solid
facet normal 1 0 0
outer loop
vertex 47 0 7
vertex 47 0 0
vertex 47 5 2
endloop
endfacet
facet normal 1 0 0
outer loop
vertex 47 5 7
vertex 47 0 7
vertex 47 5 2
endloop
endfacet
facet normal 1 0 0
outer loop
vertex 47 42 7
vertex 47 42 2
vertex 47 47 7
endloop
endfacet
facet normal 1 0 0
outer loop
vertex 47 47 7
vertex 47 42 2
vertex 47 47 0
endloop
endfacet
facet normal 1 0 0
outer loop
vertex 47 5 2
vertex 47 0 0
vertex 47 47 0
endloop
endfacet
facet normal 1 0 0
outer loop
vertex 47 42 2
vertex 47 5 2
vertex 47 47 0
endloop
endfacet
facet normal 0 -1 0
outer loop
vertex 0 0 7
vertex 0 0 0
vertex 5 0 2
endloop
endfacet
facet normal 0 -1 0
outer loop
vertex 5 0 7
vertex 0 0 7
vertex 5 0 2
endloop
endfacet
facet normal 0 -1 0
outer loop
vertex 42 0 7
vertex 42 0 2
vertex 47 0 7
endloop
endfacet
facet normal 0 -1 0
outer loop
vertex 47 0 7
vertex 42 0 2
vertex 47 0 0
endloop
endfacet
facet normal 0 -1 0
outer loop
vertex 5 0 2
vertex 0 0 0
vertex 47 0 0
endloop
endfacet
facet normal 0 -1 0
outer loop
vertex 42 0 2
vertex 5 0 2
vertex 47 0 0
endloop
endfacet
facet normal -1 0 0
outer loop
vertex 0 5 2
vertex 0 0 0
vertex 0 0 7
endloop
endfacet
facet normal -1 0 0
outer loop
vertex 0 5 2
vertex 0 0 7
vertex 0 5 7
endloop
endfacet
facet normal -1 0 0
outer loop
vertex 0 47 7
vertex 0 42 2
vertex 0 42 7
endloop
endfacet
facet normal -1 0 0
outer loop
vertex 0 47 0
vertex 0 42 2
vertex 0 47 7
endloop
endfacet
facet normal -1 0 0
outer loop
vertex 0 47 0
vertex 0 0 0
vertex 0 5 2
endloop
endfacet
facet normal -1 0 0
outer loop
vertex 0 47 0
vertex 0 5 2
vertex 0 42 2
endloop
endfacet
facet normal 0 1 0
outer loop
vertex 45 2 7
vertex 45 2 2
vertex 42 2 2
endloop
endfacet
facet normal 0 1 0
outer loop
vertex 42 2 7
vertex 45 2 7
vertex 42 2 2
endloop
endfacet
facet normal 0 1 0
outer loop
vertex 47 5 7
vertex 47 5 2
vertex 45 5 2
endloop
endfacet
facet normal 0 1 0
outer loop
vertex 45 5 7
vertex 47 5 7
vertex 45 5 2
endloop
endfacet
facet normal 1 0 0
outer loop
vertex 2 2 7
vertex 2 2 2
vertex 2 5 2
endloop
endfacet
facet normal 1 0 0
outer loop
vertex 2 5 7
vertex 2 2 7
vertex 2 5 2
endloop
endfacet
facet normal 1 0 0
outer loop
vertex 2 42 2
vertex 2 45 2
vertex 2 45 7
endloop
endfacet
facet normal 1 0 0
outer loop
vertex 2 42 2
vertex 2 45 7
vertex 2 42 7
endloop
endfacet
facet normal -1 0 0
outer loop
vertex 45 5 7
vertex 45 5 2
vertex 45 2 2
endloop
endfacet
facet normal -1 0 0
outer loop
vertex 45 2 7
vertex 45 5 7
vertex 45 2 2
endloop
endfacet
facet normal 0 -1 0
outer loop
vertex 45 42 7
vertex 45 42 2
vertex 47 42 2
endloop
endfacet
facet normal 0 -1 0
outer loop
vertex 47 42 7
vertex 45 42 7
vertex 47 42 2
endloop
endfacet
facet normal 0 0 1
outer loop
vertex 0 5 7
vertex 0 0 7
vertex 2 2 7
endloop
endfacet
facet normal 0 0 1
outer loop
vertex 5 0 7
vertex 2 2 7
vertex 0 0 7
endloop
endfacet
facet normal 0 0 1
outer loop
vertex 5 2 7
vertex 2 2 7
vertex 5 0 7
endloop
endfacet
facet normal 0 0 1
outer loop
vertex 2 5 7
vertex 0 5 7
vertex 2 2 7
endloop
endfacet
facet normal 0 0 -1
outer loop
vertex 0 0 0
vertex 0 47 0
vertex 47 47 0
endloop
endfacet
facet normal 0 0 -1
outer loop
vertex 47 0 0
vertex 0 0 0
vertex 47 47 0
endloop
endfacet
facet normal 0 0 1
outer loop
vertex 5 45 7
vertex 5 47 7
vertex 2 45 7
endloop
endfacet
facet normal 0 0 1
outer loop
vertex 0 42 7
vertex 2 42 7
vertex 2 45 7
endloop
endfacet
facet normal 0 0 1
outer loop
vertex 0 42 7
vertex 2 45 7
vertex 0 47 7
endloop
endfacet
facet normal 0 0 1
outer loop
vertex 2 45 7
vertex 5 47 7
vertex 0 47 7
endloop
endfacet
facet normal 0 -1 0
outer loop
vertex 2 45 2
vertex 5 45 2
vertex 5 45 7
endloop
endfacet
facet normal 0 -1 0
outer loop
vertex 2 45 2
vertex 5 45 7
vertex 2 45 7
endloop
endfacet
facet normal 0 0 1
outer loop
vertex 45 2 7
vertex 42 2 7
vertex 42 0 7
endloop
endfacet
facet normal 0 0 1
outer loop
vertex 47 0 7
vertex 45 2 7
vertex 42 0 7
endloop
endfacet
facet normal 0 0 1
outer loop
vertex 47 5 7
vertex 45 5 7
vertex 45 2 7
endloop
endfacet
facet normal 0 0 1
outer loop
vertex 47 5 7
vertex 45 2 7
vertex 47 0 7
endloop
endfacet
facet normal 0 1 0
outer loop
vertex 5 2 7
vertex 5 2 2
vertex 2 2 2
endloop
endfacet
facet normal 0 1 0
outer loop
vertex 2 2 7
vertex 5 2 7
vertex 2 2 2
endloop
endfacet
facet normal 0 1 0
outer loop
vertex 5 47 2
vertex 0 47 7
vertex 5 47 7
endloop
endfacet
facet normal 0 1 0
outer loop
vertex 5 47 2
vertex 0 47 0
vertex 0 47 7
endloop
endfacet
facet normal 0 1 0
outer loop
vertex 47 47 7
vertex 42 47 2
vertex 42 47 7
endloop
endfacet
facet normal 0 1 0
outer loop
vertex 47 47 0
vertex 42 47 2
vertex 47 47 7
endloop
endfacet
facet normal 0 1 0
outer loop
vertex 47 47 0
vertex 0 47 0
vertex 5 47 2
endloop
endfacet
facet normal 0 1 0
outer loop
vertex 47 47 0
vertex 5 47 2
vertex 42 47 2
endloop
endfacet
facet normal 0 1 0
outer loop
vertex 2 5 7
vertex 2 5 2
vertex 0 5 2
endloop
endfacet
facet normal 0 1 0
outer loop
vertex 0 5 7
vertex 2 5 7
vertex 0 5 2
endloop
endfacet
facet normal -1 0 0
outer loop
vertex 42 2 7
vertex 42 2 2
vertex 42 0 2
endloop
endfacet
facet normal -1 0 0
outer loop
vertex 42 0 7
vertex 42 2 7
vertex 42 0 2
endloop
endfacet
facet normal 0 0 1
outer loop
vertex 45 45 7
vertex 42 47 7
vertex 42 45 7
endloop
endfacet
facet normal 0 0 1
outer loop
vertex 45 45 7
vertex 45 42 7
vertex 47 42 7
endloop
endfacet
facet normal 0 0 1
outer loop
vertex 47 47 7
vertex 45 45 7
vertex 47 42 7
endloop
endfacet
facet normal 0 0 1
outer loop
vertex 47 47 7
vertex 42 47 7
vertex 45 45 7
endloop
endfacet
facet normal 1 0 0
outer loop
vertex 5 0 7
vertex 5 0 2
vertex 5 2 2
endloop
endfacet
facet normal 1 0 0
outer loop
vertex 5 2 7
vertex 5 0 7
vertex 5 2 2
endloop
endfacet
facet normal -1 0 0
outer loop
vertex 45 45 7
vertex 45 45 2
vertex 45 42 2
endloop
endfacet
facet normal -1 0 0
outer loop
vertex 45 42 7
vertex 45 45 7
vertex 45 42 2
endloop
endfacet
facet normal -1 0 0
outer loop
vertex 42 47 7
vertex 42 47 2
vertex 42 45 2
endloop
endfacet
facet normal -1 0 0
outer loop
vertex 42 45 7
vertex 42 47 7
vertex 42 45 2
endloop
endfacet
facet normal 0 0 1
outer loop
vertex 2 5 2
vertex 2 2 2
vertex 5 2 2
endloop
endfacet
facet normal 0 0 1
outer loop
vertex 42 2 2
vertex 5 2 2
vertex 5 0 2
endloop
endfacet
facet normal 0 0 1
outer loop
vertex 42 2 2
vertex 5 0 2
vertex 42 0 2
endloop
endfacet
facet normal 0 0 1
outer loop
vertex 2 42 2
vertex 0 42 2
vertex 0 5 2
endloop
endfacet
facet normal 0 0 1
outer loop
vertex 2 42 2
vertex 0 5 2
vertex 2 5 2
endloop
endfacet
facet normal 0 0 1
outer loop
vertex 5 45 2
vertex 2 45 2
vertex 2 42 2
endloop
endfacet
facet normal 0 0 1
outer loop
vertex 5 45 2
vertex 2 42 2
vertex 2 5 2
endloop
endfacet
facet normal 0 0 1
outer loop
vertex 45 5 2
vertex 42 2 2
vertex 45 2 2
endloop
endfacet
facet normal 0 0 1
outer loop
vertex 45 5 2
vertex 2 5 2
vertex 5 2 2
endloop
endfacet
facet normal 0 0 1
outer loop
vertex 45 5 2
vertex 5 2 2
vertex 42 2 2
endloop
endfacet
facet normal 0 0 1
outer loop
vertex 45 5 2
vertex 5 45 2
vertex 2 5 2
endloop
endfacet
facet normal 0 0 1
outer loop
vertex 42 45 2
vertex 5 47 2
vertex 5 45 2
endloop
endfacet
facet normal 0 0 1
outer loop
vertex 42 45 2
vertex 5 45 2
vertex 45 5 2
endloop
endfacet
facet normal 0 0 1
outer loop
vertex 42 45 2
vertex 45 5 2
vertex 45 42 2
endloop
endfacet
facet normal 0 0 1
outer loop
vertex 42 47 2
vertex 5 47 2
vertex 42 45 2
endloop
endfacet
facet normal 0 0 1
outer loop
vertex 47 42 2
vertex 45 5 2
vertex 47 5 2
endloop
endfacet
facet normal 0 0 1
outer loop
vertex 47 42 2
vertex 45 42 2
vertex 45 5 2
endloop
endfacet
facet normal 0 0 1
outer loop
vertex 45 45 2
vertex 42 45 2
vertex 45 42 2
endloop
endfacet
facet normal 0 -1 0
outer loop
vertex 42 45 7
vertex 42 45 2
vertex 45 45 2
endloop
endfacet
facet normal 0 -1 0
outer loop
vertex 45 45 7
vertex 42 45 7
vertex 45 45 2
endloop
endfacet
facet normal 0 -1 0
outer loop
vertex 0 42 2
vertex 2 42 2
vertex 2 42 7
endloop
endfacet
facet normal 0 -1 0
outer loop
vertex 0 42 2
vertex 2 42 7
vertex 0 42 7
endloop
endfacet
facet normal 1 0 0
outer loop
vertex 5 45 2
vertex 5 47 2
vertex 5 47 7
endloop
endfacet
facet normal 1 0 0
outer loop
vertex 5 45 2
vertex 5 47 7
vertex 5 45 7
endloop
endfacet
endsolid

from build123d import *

# Parameters (mm, degrees)
SKETCH1_W           = 47
SKETCH1_H           = 47
BOSS_EXTRUDE1_DEPTH = 2
BOSS_EXTRUDE2_DEPTH = 5


with BuildPart() as part:
    # Sketch1 → Boss-Extrude1 (new body)
    with BuildSketch(Plane.XY):
        with Locations((23.5, 23.5)):
            Rectangle(SKETCH1_W, SKETCH1_H)
    extrude(amount=BOSS_EXTRUDE1_DEPTH)

    # Sketch2 → Boss-Extrude2 (add)
    with BuildSketch(Plane.XY.offset(2)):
        Polygon((5, 47), (5, 45), (2, 45), (2, 42), (0, 42), (0, 47), align=None)
        Polygon((42, 47), (42, 45), (45, 45), (45, 42), (47, 42), (47, 47), align=None)
        Polygon((0, 5), (0, 0), (5, 0), (5, 2), (2, 2), (2, 5), align=None)
        Polygon((47, 5), (45, 5), (45, 2), (42, 2), (42, 0), (47, 0), align=None)
    extrude(amount=BOSS_EXTRUDE2_DEPTH)


solid = part.part
